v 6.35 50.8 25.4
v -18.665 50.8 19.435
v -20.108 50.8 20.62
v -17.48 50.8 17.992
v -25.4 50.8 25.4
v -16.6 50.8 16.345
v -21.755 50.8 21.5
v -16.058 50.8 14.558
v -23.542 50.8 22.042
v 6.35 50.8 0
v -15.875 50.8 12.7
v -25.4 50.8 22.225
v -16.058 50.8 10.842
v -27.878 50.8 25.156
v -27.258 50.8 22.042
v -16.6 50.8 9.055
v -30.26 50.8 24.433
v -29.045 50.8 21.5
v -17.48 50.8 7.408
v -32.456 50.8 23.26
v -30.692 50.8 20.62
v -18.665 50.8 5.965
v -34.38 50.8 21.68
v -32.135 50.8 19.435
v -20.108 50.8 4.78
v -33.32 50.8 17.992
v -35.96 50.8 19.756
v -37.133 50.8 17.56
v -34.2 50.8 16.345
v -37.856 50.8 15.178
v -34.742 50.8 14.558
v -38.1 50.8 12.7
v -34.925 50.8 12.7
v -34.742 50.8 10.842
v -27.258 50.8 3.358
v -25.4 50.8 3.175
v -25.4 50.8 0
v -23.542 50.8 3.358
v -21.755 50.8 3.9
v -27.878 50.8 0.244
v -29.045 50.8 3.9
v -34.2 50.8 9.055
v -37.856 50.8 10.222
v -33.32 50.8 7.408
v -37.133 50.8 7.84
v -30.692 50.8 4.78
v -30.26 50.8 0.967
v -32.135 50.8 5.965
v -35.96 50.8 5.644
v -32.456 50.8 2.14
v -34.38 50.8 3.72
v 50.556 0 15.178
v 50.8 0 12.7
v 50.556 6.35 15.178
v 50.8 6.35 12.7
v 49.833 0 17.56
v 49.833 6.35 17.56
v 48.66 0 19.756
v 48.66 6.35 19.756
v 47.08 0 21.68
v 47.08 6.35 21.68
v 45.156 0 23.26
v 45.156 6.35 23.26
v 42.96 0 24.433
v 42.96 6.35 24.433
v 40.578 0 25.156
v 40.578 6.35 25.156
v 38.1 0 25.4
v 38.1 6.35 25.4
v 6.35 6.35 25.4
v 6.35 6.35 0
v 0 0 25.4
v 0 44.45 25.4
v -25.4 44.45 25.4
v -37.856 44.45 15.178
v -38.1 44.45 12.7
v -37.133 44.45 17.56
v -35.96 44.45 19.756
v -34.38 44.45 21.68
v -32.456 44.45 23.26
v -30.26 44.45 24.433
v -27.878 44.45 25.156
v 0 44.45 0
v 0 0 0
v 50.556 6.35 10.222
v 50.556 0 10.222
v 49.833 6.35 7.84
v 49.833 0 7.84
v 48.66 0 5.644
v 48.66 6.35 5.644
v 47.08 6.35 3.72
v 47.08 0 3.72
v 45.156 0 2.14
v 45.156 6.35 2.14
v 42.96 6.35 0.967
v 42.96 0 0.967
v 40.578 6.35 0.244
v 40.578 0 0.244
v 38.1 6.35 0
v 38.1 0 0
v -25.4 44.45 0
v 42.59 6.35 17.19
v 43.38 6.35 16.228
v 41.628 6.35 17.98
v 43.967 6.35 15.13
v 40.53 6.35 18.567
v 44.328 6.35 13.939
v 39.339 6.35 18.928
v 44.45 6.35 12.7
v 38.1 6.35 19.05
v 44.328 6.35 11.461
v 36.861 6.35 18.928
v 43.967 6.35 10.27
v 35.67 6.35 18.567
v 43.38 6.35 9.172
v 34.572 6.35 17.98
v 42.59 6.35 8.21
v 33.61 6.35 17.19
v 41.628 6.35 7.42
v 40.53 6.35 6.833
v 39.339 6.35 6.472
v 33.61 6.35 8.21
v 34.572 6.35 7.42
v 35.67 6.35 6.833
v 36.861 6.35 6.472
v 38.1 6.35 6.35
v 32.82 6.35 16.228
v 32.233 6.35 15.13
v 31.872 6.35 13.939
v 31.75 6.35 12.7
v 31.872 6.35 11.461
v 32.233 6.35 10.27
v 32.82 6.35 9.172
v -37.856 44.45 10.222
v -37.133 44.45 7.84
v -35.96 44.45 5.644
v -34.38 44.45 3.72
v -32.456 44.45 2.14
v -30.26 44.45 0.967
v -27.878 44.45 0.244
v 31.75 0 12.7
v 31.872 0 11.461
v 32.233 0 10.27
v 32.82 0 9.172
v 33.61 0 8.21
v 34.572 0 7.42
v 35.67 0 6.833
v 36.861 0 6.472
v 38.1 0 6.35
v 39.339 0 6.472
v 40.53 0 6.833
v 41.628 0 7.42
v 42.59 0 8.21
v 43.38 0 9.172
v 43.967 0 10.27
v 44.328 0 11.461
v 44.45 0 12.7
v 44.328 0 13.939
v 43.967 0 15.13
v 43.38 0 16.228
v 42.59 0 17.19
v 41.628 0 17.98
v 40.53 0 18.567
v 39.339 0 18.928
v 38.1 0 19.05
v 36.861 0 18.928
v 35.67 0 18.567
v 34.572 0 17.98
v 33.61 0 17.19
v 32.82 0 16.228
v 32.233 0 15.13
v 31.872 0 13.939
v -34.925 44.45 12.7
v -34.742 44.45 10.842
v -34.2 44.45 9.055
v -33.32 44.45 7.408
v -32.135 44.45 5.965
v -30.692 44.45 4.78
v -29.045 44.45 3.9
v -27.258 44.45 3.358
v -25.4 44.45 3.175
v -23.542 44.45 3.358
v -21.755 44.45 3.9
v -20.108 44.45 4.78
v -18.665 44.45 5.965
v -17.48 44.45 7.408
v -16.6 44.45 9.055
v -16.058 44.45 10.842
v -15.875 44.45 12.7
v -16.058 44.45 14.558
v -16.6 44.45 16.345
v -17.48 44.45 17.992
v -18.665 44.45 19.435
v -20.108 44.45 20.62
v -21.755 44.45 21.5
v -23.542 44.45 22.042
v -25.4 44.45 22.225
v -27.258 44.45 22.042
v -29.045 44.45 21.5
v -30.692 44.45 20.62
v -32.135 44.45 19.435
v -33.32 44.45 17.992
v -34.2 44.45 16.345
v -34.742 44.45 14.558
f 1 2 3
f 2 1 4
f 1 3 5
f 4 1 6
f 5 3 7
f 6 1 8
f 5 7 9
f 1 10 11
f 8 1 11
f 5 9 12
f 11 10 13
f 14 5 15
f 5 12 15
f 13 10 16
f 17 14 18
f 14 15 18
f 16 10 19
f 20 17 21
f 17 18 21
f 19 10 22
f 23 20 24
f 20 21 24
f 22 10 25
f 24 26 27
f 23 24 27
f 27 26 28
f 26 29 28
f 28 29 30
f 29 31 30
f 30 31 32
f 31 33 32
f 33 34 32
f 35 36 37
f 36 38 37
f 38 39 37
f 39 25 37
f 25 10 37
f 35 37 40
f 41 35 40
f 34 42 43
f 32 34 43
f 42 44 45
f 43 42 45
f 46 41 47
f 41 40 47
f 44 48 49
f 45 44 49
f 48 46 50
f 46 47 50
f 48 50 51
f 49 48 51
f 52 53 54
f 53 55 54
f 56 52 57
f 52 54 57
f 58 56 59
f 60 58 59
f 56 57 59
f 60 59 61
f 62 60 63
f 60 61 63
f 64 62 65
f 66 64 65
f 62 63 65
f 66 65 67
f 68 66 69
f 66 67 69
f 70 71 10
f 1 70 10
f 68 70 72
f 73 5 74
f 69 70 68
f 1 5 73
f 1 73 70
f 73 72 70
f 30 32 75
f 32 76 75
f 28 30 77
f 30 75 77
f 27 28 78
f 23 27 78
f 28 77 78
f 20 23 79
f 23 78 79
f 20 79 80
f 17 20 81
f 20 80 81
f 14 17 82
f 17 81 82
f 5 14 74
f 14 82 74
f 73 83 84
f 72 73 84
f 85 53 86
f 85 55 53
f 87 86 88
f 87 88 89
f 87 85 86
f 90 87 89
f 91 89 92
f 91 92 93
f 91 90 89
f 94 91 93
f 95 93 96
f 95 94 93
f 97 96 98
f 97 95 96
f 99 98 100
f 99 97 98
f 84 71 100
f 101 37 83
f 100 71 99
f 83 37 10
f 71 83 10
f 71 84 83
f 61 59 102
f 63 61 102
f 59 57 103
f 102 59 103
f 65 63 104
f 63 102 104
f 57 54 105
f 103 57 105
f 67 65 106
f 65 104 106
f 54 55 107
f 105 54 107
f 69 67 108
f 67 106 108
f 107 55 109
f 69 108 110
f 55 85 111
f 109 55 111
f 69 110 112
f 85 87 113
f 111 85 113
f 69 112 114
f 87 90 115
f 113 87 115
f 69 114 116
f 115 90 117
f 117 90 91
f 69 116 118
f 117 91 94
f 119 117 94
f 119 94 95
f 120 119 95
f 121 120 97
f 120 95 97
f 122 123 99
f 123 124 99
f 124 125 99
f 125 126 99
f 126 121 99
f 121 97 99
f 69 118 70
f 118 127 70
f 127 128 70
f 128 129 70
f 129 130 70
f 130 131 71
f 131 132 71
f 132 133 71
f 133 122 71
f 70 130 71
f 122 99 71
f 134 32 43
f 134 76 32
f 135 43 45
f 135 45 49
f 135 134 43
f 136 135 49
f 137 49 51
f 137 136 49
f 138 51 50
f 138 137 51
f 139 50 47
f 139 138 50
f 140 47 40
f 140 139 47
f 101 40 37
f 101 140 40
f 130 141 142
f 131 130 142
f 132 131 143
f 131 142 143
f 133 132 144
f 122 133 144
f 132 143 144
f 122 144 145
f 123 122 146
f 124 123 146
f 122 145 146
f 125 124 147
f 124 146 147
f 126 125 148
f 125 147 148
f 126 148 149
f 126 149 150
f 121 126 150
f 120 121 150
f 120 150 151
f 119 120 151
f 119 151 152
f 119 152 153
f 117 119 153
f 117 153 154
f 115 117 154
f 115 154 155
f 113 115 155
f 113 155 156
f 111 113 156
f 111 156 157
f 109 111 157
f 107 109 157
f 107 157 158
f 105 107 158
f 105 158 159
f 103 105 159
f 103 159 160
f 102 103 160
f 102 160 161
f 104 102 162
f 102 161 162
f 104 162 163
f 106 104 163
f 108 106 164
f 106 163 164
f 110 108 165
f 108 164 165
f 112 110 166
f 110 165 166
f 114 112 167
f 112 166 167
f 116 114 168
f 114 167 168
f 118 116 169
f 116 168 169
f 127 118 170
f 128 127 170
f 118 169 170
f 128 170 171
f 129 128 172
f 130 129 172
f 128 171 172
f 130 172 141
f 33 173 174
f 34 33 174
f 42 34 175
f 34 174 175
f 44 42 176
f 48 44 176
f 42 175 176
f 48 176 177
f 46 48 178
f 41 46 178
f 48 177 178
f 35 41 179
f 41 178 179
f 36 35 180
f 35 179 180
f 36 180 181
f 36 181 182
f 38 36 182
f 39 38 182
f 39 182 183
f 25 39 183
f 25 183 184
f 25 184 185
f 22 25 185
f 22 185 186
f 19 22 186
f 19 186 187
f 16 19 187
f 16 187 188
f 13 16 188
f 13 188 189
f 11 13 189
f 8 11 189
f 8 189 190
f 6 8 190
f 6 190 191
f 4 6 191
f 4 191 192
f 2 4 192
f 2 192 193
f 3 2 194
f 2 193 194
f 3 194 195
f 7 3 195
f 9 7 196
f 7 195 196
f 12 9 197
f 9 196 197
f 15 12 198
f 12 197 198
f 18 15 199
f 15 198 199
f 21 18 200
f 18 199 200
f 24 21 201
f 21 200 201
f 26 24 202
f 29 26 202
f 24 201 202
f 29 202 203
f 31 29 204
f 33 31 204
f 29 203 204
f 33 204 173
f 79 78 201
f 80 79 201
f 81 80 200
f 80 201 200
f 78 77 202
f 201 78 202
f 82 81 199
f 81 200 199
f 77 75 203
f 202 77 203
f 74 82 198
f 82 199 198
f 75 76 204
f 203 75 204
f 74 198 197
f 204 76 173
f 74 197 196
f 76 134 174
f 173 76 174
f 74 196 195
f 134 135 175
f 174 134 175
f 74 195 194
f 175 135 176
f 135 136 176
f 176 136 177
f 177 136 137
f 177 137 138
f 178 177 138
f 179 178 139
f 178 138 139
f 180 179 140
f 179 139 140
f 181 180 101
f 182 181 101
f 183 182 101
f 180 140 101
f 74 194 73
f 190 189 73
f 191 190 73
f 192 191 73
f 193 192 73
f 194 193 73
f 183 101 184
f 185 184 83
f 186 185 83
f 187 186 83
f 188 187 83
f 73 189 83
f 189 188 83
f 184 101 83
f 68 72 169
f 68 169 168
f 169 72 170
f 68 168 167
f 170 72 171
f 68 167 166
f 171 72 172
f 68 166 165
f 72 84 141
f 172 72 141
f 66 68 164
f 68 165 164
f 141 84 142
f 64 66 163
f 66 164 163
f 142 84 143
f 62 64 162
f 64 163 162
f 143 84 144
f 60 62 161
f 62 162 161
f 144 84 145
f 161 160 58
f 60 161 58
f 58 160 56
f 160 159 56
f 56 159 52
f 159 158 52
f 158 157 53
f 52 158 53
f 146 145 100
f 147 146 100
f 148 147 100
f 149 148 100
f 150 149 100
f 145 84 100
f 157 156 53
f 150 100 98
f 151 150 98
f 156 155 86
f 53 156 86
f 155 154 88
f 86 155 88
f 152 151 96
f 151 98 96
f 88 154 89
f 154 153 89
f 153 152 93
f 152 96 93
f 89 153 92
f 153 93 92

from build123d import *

# Parameters (mm, degrees)
BOSS_EXTRUDE1_DEPTH         = 25.4
FILLET1_R                   = 12.7
F_3_4_0_75_DIAMETER_HOLE1_D = 19.05
F_1_2_0_5_DIAMETER_HOLE2_D  = 12.7


with BuildPart() as part:
    # Sketch1 → Boss-Extrude1 (new body)
    with BuildSketch(Plane.XY):
        Polygon((-38.1, 44.45), (0, 44.45), (0, 0), (50.8, 0), (50.8, 6.35), (6.35, 6.35), (6.35, 50.8), (-38.1, 50.8), align=None)
    extrude(amount=BOSS_EXTRUDE1_DEPTH)

    # Fillet1
    fillet1_edges = [part.edges().sort_by_distance(p)[0] for p in [
        (50.8, 3.175, 0),
        (-38.1, 47.625, 0),
        (50.8, 3.175, 25.4),
        (-38.1, 47.625, 25.4),
    ]]
    fillet(fillet1_edges, radius=FILLET1_R - 0.0001)  # a hair under: the kernel refuses the full size

    # 3/4 (0.75) Diameter Hole1 (through all)
    with Locations(Plane(origin=(0, 50.8, 0), x_dir=(1, 0, 0), z_dir=(0, 1, 0))):
        with Locations((-25.4, -12.7)):
            Hole(F_3_4_0_75_DIAMETER_HOLE1_D / 2)

    # 1/2 (0.5) Diameter Hole2 (through all)
    with Locations(Plane(origin=(0, 6.35, 0), x_dir=(1, 0, 0), z_dir=(0, 1, 0))):
        with Locations((38.1, -12.7)):
            Hole(F_1_2_0_5_DIAMETER_HOLE2_D / 2)


solid = part.part
